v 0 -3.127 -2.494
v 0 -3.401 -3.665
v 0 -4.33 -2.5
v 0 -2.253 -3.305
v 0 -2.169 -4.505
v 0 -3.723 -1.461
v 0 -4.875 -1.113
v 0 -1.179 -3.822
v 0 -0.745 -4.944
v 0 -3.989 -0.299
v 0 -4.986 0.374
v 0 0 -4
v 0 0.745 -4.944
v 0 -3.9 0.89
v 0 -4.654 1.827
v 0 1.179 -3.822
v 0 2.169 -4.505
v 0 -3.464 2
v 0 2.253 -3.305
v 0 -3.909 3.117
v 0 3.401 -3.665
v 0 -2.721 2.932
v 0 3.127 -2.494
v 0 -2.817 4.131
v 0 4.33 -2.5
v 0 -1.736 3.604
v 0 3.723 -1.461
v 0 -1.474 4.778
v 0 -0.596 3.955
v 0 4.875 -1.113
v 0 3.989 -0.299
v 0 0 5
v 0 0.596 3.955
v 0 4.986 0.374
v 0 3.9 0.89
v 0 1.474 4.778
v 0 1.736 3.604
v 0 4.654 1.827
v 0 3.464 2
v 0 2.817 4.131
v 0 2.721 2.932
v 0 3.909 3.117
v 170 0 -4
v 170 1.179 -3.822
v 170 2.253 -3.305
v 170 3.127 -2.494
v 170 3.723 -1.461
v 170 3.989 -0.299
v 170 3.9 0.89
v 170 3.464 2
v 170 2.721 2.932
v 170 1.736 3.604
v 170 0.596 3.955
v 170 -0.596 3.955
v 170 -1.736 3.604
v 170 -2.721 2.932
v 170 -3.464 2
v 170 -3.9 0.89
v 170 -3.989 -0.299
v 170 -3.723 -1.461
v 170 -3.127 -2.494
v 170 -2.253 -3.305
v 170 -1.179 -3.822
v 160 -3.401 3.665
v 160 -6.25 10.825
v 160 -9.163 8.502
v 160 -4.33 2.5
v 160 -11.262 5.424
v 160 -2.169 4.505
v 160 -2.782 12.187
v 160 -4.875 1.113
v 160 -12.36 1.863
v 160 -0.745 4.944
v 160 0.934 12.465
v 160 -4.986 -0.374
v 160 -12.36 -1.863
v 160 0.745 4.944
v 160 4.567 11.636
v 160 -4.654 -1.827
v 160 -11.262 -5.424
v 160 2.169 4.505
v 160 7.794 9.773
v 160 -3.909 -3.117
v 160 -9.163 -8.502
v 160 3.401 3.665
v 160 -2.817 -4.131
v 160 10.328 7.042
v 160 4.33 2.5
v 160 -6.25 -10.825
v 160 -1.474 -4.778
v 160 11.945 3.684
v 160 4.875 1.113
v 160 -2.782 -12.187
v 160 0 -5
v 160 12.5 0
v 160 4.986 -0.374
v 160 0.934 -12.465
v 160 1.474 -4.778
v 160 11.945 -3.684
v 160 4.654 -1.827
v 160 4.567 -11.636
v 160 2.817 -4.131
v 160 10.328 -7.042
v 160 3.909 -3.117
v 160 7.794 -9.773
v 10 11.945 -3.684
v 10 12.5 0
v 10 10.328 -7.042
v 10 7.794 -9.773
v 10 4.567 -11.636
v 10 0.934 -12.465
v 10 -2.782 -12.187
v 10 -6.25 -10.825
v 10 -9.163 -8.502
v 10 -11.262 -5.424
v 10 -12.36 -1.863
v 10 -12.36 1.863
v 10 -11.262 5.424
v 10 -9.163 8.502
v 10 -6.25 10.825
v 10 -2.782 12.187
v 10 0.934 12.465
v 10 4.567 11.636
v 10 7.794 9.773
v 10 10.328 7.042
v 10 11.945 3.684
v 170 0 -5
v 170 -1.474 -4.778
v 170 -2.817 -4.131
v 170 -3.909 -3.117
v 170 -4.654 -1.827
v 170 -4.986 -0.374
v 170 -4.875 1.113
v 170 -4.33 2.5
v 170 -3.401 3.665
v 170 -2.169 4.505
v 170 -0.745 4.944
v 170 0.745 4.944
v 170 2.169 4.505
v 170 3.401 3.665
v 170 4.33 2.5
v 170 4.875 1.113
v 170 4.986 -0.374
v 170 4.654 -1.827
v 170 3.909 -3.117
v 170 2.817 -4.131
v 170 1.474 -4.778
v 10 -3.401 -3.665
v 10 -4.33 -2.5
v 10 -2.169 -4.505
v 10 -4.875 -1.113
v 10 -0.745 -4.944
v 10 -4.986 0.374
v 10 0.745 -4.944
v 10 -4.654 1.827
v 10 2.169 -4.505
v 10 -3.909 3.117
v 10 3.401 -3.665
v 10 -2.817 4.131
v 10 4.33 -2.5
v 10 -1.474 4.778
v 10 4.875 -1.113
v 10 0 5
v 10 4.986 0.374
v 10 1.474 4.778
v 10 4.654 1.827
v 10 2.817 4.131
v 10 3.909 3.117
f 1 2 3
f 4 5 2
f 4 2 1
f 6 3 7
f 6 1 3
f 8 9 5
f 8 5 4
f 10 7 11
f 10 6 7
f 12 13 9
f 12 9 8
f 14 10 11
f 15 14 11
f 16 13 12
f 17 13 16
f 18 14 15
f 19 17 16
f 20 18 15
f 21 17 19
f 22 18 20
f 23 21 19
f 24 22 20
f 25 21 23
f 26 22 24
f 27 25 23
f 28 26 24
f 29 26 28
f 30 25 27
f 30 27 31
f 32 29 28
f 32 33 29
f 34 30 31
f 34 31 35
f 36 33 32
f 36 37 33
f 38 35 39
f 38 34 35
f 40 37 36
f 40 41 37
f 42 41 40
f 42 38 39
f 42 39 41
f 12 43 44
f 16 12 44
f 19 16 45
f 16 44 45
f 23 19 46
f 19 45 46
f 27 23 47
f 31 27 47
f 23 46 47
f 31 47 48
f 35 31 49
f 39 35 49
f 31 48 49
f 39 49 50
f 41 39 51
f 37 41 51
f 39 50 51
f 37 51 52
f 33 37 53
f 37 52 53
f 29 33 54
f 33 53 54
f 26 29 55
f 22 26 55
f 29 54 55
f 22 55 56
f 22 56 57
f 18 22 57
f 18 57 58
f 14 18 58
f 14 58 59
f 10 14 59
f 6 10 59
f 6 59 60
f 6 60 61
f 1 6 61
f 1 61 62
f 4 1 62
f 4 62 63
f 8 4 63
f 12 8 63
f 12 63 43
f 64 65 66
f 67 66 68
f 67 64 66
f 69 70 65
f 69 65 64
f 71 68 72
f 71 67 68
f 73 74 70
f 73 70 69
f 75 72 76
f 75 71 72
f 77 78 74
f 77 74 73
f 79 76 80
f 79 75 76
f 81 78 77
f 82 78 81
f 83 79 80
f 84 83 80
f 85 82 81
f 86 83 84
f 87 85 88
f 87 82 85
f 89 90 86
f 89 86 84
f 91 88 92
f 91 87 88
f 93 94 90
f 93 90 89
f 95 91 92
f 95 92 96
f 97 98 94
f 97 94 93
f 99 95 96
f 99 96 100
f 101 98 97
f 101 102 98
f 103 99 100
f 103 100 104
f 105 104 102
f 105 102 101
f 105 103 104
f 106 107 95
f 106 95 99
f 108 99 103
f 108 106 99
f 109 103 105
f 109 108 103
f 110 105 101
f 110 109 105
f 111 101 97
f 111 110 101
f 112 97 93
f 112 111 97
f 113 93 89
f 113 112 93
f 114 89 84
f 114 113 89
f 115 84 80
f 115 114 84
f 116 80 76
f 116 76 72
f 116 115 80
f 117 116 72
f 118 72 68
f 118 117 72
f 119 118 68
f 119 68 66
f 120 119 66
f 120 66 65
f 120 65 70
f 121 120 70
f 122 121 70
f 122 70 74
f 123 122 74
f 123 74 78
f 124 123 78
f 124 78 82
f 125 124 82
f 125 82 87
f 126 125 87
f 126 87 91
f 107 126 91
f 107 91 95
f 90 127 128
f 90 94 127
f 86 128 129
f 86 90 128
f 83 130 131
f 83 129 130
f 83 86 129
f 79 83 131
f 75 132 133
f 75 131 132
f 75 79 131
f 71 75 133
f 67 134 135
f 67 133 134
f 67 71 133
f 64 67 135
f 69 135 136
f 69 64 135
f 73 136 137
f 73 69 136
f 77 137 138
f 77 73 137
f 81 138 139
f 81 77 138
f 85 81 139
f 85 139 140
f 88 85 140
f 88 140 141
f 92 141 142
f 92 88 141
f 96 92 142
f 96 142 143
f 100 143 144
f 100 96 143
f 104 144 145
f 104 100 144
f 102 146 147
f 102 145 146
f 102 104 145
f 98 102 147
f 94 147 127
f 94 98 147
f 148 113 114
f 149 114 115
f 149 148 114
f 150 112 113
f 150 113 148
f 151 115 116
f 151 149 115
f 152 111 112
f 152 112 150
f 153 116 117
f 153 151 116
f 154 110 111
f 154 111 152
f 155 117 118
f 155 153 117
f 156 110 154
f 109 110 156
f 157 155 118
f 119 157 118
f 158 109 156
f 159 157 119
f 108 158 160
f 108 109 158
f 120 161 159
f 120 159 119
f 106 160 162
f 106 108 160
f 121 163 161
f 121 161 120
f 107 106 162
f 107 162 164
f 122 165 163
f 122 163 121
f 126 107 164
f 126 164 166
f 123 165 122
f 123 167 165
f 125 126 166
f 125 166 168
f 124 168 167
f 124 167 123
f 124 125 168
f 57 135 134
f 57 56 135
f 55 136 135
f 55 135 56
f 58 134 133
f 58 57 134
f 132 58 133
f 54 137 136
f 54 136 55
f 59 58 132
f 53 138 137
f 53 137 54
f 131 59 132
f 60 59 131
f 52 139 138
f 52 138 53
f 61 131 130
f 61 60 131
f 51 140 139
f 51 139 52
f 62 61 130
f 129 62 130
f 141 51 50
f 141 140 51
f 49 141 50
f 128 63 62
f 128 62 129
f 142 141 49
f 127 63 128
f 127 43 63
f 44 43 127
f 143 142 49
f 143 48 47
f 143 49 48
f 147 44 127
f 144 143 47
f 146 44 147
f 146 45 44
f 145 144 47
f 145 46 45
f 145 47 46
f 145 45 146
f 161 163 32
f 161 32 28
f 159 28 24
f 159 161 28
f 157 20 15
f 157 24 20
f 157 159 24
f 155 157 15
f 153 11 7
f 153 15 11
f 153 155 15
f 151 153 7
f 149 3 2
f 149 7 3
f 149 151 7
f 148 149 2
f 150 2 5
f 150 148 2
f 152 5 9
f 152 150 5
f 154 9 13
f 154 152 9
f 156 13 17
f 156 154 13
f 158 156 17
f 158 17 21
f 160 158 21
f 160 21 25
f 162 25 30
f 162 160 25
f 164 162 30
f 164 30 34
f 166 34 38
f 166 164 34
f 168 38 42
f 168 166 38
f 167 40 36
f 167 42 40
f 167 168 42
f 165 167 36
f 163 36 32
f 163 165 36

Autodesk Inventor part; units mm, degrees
ref_plane "YZ Plane" through (0, 0, 0) normal (1, 0, 0) x (0, 1, 0)
ref_plane "XZ Plane" through (0, 0, 0) normal (0, 1, 0) x (-1, 0, 0)
ref_plane "XY Plane" through (0, 0, 0) normal (0, 0, 1) x (1, 0, 0)
sketch "Sketch1" plane through (0, 0, 0) normal (1, 0, 0) x (0, 1, 0)
  circle A0 centre (0, 0) radius 12.5
  dimension "d0" = 25
extrude "Extrusion1" add sketch "Sketch1" along normal blind 170
sketch "Sketch2" plane through (170, 0, 0) normal (1, 0, 0) x (0, 0, -1)
  circle A0 centre (0, 0) radius 12.5
  dimension "d3" = 25
extrude "Extrusion2" cut sketch "Sketch2" against normal blind 10
sketch "Sketch3" plane through (160, 0, 0) normal (1, 0, 0) x (0, 0, -1)
  circle A0 centre (0, 0) radius 5
  dimension "d6" = 10
extrude "Extrusion3" add sketch "Sketch3" along normal blind 10
sketch "Sketch4" plane through (0, 0, 0) normal (-1, 0, 0) x (0, 0, 1)
  circle A0 centre (0, 0) radius 12.5
  dimension "d9" = 25
extrude "Extrusion4" cut sketch "Sketch4" against normal blind 10
sketch "Sketch5" plane through (10, 0, 0) normal (-1, 0, 0) x (0, 0, 1)
  circle A0 centre (0, 0) radius 5 projected
  circle A1 centre (0, 0) radius 5
extrude "Extrusion5" add sketch "Sketch5" along normal blind 10
sketch "Sketch6" plane through (170, 0, 0) normal (1, 0, 0) x (0, 0, -1)
  circle A0 centre (0, 0) radius 4
  dimension "d14" = 8
extrude "Extrusion6" cut sketch "Sketch6" against normal blind 170
properties part number "laserbody" material "Polycarbonate, Clear"
